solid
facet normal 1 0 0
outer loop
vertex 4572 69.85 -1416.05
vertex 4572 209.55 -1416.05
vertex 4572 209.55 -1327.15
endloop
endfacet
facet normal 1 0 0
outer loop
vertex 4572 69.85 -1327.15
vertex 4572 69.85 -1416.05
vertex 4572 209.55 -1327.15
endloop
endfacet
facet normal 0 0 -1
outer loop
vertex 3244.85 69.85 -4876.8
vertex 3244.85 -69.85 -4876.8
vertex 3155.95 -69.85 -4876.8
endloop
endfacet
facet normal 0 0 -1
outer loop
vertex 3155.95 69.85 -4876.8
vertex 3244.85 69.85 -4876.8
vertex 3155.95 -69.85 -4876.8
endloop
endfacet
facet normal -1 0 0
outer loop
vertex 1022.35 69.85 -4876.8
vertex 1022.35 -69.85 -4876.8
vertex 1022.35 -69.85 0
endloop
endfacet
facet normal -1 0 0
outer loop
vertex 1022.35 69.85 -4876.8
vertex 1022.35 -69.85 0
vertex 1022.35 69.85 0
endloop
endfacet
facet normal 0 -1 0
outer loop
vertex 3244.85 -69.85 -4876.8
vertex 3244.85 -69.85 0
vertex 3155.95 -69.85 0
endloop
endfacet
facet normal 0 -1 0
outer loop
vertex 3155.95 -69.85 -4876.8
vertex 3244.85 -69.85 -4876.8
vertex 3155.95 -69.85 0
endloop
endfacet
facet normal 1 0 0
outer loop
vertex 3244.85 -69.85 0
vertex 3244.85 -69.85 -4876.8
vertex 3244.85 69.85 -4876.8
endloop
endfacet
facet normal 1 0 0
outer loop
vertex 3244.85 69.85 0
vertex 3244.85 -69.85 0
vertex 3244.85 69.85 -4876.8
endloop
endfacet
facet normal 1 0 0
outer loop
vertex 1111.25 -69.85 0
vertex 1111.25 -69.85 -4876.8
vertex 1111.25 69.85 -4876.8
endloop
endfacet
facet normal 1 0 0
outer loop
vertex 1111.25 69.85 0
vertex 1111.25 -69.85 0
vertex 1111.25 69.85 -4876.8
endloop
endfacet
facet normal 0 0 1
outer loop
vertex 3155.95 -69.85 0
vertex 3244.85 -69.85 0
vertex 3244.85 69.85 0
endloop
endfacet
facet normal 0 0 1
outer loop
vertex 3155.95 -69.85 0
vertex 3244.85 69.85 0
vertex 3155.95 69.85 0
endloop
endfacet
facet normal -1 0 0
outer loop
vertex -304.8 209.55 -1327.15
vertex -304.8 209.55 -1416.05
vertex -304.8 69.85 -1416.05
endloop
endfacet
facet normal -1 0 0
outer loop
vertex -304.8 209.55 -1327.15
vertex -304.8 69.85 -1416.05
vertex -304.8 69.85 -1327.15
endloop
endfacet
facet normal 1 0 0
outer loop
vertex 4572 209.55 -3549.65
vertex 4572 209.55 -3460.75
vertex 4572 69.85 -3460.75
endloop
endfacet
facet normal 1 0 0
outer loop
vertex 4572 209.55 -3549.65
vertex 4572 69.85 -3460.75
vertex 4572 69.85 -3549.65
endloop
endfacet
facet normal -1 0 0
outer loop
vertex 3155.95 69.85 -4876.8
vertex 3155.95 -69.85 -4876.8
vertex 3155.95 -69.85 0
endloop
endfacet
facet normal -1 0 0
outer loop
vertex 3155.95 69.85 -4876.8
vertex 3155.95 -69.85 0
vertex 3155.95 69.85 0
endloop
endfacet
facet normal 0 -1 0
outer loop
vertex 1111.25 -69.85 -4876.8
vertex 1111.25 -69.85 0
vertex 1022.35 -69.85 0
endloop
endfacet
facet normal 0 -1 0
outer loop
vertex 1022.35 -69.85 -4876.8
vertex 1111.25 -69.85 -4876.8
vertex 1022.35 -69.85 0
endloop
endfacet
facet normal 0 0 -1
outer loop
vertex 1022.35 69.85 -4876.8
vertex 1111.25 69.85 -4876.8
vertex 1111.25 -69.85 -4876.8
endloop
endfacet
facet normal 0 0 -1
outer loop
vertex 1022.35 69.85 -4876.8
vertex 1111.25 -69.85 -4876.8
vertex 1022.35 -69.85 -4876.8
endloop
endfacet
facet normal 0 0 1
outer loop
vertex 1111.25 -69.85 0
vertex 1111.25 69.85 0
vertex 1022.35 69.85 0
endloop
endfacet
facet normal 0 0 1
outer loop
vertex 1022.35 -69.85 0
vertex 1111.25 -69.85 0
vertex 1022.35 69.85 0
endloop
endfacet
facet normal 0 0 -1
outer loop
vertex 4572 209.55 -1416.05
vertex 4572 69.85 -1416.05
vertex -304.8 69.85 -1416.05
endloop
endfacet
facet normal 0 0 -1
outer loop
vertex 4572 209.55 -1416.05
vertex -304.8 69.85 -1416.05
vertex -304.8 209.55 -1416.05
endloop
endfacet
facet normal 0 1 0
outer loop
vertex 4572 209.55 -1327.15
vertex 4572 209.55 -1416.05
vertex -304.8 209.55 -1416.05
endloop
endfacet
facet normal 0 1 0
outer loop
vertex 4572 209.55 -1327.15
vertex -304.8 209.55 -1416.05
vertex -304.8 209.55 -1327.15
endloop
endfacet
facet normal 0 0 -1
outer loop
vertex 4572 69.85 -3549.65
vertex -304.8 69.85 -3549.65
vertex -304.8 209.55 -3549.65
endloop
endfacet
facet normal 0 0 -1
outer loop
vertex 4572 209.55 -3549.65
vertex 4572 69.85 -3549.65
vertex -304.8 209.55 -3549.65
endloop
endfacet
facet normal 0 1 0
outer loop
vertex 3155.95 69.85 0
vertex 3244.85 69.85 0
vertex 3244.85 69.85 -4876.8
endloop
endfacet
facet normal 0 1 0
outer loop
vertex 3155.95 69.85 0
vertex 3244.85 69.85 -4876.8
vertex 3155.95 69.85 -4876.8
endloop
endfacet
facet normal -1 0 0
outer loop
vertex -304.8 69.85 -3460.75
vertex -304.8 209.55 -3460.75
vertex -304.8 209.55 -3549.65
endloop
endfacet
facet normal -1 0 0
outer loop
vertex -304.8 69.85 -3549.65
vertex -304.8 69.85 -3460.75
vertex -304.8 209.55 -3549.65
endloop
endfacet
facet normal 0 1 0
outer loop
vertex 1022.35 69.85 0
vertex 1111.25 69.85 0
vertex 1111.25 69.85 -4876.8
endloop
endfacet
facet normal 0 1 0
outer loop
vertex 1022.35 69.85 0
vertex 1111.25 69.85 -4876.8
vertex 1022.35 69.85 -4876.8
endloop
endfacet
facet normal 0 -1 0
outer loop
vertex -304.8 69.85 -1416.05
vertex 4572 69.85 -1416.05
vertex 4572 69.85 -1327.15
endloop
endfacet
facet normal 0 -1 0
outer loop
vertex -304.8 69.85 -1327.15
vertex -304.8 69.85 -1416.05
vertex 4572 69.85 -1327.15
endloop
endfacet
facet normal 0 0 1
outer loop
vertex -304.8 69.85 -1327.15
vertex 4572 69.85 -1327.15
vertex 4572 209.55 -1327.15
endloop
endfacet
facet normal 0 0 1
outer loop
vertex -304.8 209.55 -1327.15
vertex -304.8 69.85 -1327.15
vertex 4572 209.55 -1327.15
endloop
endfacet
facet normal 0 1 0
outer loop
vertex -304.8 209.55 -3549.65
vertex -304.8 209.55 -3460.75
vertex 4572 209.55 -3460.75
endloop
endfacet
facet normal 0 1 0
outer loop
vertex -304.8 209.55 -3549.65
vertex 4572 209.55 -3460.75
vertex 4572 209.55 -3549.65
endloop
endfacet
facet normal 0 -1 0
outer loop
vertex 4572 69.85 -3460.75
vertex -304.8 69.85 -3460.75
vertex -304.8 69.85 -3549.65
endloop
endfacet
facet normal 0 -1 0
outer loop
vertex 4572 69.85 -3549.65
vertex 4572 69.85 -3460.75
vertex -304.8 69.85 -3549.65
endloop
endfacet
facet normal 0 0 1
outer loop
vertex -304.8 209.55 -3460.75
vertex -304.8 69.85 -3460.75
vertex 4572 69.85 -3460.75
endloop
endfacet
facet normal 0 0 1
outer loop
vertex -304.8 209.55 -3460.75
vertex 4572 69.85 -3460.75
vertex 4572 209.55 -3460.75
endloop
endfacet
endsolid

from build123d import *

# Parameters (mm, degrees)
SKETCH1_W              = 88.9
SKETCH1_H              = 139.7
PROFILES_4X6_1_DEPTH   = 4876.8
SKETCH1_ON_SEGMENT_2_W = 88.9
SKETCH1_ON_SEGMENT_2_H = 139.7
PROFILES_4X6_1_2_DEPTH = 4876.8
SKETCH1_ON_SEGMENT_3_W = 88.9
SKETCH1_ON_SEGMENT_3_H = 139.7
PROFILES_4X6_1_3_DEPTH = 4876.8
SKETCH1_ON_SEGMENT_4_W = 88.9
SKETCH1_ON_SEGMENT_4_H = 139.7
PROFILES_4X6_1_4_DEPTH = 4876.8


with BuildPart() as part:
    # Sketch1 → Profiles 4X6(1) (new body)
    with BuildSketch(Plane(origin=(1066.8, 0, 0), x_dir=(-1, 0, 0), z_dir=(0, 0, -1))):
        Rectangle(SKETCH1_W, SKETCH1_H)
    extrude(amount=PROFILES_4X6_1_DEPTH)


with BuildPart() as body_2:
    # Sketch1 on segment 2 (carried to segment 2) → Profiles 4X6_1 2 (new body)
    with BuildSketch(Plane(origin=(3200.4, 0, 0), x_dir=(-1, 0, 0), z_dir=(0, 0, -1))):
        Rectangle(SKETCH1_ON_SEGMENT_2_W, SKETCH1_ON_SEGMENT_2_H)
    extrude(amount=PROFILES_4X6_1_2_DEPTH)


with BuildPart() as body_3:
    # Sketch1 on segment 3 (carried to segment 3) → Profiles 4X6_1 3 (new body)
    with BuildSketch(Plane(origin=(-304.8, 139.7, -3505.2), x_dir=(0, 0, -1), z_dir=(1, 0, 0))):
        Rectangle(SKETCH1_ON_SEGMENT_3_W, SKETCH1_ON_SEGMENT_3_H)
    extrude(amount=PROFILES_4X6_1_3_DEPTH)


with BuildPart() as body_4:
    # Sketch1 on segment 4 (carried to segment 4) → Profiles 4X6_1 4 (new body)
    with BuildSketch(Plane(origin=(4572, 139.7, -1371.6), x_dir=(0, 0, 1), z_dir=(-1, 0, 0))):
        Rectangle(SKETCH1_ON_SEGMENT_4_W, SKETCH1_ON_SEGMENT_4_H)
    extrude(amount=PROFILES_4X6_1_4_DEPTH)


solid = Compound([part.part, body_2.part, body_3.part, body_4.part])
